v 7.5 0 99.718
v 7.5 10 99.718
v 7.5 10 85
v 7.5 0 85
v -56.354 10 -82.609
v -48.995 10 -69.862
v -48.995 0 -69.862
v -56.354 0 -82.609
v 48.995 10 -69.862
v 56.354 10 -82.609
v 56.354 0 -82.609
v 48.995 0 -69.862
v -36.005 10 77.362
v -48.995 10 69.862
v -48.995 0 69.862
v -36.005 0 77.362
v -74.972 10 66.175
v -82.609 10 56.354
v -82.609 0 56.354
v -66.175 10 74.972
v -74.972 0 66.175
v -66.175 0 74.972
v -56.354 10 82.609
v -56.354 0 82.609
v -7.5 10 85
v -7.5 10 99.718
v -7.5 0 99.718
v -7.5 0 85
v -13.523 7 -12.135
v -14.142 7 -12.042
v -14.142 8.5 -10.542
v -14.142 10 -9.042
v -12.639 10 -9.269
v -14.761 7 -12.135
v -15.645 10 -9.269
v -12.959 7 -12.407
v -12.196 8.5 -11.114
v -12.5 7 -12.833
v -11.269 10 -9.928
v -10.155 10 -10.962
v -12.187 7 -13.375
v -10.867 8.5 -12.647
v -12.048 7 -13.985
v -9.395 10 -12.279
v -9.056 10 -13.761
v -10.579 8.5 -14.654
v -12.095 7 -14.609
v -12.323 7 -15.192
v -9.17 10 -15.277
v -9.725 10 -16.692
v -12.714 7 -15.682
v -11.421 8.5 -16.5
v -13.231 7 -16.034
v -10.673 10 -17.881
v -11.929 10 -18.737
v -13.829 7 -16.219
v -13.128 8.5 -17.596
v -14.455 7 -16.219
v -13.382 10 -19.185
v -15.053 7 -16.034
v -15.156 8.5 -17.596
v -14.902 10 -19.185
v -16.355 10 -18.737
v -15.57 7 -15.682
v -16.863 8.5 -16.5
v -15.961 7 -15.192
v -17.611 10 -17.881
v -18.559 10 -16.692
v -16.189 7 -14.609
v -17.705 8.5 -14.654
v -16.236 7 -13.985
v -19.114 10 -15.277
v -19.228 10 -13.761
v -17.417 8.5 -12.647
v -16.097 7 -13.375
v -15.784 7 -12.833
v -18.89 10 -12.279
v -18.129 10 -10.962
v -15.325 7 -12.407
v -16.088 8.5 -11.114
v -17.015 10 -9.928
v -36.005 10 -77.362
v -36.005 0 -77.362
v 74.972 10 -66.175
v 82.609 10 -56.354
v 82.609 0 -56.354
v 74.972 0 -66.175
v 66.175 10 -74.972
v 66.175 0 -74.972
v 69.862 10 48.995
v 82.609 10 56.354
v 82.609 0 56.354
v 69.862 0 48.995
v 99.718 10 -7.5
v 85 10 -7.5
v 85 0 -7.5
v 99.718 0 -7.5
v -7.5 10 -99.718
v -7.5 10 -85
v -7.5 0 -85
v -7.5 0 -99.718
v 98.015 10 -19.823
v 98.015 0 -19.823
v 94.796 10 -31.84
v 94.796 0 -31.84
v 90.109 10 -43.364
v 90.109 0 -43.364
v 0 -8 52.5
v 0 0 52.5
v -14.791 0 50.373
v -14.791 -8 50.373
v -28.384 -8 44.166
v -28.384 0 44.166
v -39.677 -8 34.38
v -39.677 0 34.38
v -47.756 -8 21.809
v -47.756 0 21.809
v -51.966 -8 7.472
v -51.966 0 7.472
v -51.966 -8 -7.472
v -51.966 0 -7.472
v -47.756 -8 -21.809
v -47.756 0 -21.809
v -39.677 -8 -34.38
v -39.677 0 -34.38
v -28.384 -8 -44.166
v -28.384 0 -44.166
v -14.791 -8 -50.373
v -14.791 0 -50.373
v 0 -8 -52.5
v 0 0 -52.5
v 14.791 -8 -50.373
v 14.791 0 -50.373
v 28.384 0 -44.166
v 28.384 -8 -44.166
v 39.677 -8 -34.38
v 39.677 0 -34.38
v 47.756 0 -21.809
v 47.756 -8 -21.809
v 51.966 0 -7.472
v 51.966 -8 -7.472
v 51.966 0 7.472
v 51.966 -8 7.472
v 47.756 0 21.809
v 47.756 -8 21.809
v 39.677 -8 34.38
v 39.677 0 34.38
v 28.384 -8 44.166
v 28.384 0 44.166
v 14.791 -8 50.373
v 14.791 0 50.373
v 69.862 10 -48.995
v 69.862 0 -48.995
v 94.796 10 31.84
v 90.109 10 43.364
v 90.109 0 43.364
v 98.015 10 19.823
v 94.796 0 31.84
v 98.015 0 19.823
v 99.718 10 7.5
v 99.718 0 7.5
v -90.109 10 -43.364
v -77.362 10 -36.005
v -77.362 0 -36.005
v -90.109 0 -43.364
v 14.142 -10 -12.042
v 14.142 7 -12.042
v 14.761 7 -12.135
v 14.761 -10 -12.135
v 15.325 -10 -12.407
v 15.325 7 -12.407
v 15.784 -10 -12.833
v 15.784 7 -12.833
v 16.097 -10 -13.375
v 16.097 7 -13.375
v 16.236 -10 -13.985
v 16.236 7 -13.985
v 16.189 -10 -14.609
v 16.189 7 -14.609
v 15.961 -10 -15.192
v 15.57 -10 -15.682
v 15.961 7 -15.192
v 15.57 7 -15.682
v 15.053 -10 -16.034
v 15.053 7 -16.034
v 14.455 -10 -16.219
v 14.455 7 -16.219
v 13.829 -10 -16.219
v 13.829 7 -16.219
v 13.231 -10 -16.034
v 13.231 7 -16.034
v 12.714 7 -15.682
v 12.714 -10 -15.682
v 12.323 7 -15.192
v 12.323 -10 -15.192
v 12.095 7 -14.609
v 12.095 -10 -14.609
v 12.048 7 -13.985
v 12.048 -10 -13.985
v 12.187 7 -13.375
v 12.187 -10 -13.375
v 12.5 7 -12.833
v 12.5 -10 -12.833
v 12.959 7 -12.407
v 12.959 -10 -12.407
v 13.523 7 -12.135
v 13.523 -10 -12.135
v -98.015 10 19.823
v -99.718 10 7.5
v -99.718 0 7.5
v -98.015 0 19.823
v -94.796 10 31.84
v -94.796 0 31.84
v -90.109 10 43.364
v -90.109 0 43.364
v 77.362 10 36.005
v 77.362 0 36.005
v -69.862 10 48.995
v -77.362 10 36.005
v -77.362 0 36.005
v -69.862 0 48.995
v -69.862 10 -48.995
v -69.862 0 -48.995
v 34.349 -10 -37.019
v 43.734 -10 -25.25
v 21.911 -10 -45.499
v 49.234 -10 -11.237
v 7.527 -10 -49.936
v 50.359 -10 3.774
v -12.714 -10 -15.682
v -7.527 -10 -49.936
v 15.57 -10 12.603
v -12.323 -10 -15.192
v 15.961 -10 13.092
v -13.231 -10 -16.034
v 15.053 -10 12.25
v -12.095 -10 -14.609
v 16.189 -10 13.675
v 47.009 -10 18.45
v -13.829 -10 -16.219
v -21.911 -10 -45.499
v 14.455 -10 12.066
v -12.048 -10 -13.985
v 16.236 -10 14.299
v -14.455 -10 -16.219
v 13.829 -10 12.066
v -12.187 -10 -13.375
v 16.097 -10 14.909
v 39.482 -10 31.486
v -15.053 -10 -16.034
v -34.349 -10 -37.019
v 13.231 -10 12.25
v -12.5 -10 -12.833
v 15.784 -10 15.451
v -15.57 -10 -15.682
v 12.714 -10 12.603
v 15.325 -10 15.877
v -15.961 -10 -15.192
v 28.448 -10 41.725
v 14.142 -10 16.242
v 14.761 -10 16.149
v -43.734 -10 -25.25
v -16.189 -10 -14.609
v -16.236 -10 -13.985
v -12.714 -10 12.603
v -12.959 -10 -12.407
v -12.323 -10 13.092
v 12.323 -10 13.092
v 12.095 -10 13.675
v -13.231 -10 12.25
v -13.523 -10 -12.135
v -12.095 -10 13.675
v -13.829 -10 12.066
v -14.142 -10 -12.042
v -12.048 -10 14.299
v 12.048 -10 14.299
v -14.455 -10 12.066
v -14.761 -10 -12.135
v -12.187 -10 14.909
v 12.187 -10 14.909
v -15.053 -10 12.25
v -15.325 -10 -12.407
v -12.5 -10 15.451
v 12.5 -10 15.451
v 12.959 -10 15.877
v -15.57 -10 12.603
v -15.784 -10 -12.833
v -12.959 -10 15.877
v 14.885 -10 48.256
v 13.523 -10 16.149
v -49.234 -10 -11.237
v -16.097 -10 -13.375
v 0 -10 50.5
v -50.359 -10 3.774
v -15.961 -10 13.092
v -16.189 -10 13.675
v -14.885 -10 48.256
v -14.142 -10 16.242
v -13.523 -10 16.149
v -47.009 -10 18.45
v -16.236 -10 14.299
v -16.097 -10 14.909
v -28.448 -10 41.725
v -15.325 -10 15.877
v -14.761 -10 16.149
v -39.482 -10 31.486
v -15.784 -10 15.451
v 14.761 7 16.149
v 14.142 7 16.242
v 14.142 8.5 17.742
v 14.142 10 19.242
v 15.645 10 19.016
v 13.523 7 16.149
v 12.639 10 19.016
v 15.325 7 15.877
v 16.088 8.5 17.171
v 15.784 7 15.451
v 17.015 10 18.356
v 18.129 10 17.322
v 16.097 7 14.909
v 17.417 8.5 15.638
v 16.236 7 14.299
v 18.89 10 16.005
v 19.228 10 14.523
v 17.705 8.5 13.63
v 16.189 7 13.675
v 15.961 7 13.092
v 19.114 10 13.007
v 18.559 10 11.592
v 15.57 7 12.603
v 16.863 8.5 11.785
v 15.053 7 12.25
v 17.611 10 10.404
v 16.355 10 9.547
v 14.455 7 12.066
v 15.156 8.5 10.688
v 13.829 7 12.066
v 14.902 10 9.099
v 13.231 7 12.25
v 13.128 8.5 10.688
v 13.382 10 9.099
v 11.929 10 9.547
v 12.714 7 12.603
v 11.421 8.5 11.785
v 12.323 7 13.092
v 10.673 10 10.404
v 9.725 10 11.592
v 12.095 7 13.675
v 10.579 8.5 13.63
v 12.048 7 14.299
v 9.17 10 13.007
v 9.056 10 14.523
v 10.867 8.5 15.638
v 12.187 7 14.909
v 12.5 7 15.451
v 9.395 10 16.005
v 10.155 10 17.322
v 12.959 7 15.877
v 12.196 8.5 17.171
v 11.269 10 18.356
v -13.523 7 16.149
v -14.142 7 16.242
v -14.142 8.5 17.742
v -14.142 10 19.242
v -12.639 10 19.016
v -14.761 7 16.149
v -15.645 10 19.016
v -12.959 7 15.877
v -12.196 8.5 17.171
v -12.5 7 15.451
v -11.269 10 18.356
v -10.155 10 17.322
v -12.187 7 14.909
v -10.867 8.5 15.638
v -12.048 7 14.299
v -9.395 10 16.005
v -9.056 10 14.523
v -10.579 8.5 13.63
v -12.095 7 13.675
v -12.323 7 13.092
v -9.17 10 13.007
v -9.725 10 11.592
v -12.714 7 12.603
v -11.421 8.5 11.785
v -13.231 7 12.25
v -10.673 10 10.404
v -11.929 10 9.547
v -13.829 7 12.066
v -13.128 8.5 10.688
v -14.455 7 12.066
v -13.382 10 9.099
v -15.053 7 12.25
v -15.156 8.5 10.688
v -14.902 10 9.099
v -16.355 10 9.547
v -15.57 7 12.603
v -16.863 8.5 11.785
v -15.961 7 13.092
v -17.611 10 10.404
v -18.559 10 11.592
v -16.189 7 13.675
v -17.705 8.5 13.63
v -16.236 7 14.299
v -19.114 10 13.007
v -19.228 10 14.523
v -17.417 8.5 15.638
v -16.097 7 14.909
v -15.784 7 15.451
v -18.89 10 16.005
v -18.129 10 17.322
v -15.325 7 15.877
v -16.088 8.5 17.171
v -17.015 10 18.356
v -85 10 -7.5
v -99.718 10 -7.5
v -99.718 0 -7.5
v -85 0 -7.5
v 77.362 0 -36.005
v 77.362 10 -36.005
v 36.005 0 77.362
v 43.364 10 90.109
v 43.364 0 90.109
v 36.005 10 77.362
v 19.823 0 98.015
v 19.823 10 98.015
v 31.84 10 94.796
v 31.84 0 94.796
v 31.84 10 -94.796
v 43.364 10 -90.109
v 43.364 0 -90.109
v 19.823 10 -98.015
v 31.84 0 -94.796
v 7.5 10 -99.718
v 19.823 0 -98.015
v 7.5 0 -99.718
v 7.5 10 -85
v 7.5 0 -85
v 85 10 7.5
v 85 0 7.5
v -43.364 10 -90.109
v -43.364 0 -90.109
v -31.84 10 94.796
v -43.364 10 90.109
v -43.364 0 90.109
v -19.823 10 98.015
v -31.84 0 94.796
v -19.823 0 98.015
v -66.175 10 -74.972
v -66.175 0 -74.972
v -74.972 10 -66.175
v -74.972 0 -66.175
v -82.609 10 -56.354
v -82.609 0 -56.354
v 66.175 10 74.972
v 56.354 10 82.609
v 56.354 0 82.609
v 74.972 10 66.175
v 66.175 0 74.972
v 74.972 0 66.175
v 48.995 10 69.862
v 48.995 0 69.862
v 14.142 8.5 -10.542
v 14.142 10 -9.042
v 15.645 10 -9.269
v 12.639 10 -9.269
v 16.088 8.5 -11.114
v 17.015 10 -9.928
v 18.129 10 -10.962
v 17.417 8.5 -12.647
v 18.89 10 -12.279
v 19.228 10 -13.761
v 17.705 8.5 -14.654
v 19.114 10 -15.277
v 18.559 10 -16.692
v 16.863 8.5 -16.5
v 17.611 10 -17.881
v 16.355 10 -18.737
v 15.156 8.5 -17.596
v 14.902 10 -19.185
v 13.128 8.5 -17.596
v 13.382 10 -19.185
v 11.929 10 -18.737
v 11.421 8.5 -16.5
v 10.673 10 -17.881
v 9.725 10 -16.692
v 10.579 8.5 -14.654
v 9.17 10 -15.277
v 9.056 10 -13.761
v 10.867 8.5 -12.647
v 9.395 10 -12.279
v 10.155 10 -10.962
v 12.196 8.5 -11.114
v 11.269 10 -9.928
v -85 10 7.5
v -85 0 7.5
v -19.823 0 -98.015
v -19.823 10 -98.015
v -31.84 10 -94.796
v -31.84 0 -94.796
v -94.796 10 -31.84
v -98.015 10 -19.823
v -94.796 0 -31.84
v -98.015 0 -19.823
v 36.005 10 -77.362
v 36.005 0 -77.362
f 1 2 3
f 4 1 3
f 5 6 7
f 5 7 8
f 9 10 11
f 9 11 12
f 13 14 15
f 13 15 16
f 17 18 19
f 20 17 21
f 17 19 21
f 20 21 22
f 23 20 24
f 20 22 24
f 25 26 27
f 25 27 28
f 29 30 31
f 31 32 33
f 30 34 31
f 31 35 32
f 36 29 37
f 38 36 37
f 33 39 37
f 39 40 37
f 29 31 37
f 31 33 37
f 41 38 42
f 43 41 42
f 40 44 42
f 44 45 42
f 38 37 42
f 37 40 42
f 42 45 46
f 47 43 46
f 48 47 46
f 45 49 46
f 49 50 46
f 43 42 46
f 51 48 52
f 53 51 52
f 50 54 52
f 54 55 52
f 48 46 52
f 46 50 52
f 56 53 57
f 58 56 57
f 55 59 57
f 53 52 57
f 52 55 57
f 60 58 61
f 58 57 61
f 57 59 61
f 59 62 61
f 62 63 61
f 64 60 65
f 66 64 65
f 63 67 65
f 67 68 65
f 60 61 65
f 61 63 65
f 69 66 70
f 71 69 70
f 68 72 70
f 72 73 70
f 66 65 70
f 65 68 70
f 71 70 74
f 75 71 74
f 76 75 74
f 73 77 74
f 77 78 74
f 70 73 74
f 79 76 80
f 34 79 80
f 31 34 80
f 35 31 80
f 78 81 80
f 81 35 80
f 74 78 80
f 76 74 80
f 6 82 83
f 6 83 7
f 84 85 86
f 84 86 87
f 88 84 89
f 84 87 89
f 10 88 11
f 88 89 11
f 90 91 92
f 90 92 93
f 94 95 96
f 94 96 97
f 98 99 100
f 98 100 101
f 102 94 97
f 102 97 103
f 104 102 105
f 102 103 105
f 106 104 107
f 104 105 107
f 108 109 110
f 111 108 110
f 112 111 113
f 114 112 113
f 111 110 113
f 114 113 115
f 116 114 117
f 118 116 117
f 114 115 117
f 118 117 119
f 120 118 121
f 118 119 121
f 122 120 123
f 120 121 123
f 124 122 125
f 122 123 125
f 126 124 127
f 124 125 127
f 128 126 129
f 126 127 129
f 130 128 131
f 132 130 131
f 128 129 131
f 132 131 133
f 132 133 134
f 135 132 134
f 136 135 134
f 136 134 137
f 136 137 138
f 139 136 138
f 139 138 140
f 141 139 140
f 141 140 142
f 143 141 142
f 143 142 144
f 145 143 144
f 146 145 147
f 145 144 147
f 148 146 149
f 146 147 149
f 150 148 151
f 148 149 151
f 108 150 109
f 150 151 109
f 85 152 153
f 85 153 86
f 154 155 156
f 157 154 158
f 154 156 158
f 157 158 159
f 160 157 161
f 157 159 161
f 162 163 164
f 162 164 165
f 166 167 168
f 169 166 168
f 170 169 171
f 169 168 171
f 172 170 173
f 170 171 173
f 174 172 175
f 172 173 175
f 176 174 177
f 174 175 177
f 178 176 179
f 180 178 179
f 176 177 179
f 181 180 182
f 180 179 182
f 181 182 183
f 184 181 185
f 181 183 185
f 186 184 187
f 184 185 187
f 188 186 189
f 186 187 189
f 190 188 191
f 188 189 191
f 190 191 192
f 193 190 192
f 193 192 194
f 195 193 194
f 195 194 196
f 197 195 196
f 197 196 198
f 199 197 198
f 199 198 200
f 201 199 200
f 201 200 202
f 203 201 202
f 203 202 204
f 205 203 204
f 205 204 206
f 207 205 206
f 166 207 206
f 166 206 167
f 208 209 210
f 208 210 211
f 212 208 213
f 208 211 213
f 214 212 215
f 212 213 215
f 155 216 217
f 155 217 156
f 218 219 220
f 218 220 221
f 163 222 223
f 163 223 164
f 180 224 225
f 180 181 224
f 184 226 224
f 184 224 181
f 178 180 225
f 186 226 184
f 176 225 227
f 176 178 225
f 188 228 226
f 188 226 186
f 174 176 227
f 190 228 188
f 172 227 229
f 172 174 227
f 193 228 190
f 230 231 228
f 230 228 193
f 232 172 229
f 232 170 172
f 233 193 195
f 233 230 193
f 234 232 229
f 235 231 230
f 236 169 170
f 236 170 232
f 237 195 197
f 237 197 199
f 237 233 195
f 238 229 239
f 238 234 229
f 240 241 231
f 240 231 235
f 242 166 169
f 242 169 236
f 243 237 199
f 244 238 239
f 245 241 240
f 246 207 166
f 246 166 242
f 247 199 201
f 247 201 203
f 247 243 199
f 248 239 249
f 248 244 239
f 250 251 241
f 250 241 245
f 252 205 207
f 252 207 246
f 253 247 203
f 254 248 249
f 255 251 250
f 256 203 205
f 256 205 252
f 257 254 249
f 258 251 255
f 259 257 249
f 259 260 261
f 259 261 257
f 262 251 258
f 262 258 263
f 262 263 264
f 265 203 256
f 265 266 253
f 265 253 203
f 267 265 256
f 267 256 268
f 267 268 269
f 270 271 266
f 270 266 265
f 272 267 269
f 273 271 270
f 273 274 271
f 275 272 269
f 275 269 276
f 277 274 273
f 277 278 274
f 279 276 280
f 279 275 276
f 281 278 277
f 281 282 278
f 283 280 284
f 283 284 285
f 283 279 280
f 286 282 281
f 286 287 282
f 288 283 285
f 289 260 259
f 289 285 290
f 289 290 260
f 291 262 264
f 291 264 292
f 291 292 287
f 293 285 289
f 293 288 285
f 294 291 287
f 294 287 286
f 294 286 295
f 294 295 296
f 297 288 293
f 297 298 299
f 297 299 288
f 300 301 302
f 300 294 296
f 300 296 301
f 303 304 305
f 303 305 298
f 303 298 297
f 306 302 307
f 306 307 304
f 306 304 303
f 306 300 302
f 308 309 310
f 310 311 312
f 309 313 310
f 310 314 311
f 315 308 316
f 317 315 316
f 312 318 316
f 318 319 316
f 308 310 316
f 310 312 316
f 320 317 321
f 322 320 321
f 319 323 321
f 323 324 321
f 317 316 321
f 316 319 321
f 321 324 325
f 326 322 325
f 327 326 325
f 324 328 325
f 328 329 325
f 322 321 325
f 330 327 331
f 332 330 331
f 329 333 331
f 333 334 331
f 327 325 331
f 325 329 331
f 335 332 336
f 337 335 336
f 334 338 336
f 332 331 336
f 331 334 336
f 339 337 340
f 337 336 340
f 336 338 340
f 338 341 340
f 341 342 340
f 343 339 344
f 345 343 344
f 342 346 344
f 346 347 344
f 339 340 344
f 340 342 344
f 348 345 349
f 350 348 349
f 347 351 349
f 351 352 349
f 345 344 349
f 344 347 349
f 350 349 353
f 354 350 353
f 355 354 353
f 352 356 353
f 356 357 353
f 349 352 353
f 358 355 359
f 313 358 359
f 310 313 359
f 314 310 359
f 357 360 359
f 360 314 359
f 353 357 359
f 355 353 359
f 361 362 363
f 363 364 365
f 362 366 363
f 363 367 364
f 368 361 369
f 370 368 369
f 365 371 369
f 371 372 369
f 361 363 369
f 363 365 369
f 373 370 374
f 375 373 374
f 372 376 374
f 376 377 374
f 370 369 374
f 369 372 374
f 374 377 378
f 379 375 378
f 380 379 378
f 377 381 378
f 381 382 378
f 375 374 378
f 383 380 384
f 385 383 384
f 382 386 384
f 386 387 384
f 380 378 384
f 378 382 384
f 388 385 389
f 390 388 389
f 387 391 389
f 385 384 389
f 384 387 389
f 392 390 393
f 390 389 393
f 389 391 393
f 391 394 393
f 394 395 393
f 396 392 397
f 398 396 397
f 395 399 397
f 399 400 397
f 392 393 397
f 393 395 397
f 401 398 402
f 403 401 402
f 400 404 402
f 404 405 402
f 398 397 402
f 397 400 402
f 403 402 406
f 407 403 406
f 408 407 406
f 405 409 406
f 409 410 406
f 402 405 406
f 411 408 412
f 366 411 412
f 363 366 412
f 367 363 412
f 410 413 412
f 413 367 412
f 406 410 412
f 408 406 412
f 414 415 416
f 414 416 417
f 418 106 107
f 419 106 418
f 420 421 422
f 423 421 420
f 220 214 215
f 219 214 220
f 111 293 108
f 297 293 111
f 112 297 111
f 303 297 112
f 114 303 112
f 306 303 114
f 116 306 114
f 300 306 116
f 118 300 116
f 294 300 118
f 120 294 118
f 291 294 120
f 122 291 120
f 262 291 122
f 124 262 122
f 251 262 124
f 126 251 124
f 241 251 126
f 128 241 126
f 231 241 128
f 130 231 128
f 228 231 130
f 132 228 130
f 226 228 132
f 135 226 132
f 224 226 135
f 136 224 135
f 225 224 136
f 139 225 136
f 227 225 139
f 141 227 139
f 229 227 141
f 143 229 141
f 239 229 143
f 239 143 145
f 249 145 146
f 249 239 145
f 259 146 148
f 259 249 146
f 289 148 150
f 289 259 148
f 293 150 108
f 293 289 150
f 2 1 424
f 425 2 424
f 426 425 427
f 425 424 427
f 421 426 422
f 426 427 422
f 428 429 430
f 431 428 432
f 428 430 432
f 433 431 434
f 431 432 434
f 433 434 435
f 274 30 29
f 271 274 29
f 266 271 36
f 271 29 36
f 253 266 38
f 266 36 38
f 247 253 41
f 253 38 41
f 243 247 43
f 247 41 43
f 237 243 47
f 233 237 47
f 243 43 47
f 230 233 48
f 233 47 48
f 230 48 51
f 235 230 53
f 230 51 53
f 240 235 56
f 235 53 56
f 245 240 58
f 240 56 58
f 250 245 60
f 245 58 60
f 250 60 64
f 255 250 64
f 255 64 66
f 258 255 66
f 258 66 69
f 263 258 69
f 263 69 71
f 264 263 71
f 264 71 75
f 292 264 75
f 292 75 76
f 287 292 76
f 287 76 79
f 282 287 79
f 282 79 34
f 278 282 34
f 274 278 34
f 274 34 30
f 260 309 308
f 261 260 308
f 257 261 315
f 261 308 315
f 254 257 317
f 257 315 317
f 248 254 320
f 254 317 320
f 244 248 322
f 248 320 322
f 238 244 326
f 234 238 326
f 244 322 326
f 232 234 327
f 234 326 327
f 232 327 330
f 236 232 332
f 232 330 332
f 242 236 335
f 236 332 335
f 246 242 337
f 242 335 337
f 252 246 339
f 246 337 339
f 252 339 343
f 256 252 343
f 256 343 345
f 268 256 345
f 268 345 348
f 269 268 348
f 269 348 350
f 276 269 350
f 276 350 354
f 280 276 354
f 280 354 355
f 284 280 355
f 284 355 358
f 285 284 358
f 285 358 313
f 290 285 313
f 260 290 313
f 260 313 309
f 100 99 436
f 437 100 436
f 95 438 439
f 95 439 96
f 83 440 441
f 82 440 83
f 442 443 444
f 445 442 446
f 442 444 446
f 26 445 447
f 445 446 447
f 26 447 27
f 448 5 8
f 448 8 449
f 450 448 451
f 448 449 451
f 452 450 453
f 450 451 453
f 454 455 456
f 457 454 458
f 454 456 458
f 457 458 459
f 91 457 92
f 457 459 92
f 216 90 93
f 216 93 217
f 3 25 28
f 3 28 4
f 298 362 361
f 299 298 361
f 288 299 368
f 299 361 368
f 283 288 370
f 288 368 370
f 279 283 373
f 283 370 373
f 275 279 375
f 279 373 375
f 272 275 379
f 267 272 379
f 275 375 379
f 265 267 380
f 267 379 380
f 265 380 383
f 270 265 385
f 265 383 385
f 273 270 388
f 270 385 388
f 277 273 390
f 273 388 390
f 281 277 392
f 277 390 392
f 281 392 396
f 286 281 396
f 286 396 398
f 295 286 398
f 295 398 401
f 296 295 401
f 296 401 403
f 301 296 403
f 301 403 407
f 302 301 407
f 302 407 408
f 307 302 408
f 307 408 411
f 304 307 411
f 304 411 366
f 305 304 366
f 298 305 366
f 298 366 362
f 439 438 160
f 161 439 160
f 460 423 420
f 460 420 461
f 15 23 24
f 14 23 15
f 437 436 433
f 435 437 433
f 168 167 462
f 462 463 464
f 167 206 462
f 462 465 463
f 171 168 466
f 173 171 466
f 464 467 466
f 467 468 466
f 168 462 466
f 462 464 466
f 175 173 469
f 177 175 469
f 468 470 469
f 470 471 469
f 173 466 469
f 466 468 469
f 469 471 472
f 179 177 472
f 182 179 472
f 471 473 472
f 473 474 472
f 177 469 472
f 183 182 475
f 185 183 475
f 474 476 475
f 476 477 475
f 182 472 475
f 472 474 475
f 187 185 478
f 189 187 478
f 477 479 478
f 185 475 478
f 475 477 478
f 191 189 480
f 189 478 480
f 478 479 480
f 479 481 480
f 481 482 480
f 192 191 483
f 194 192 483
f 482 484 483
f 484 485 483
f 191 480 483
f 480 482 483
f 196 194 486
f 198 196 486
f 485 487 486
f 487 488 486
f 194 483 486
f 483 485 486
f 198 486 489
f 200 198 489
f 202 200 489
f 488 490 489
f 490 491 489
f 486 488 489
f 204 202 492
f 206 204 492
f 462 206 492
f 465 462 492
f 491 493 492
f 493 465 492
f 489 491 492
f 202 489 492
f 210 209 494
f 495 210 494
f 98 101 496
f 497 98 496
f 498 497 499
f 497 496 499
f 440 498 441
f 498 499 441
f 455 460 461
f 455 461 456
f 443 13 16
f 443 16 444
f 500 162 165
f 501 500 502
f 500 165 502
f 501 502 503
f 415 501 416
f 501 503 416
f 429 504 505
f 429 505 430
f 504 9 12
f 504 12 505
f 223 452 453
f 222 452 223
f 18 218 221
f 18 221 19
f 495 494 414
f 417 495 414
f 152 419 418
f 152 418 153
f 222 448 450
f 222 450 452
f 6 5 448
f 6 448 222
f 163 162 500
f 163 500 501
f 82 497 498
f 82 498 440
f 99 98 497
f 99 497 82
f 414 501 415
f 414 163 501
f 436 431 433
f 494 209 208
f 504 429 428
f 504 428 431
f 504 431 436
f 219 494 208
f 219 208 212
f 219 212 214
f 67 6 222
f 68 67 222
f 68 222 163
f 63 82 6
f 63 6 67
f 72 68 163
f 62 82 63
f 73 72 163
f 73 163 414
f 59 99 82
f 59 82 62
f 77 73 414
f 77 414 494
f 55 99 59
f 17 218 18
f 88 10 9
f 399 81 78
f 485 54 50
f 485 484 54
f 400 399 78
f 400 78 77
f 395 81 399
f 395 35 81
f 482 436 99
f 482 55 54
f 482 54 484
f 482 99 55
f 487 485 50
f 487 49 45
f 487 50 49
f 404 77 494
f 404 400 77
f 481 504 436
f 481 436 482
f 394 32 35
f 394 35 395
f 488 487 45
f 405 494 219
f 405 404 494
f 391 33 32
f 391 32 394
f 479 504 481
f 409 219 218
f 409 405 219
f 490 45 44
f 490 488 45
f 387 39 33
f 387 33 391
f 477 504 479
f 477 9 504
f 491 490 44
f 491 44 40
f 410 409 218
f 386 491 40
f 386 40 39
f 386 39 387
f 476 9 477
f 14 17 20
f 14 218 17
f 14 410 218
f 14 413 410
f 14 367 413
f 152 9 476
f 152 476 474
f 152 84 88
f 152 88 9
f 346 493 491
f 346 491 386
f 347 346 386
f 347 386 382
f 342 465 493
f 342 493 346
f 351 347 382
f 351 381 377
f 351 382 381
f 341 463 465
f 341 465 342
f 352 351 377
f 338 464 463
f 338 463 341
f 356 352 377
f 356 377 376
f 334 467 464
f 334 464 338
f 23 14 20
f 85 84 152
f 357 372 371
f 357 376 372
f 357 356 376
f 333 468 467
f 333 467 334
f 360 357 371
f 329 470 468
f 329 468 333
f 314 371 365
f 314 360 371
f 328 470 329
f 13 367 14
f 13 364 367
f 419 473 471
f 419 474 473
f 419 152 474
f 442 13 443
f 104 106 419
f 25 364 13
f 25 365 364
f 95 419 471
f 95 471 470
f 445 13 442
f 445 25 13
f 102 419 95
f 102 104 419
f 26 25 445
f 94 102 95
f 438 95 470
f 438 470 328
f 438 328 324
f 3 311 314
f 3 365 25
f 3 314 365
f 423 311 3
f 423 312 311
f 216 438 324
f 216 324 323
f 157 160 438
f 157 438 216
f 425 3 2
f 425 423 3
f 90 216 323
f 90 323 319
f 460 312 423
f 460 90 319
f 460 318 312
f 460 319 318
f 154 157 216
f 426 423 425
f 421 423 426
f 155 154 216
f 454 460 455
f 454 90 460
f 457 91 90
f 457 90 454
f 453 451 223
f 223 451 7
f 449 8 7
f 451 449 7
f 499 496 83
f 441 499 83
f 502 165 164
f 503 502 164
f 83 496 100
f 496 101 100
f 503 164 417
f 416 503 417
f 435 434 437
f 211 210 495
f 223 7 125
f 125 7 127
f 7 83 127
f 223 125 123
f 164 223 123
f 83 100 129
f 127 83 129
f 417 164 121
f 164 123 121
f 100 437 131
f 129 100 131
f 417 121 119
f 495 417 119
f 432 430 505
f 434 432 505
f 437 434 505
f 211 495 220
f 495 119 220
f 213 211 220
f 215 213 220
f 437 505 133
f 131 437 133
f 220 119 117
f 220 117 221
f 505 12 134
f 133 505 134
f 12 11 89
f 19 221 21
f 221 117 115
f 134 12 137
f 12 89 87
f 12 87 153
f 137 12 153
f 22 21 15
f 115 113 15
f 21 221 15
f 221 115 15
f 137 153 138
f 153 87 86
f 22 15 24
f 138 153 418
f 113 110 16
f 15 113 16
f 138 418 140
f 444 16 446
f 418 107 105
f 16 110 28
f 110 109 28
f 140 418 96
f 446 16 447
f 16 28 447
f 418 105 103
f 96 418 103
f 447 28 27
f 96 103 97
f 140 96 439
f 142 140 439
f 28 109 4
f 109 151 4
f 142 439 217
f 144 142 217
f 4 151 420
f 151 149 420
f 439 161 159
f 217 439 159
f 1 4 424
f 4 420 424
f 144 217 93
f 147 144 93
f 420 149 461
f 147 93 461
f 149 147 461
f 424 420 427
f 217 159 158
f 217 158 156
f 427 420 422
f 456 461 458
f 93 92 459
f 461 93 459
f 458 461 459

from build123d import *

# Parameters (mm, degrees)
SKIZZE1_R                       = 100
AUFSATZ_LINEAR_AUSTRAGEN1_DEPTH = 10
SKIZZE2_W                       = 15
SKIZZE2_H                       = 15
SCHNITT_LINEAR_AUSTRAGEN1_DEPTH = 142.774468788
SKIZZE3_R                       = 52.5
AUFSATZ_LINEAR_AUSTRAGEN2_DEPTH = 10
FASE1_SIZE                      = 2
SKIZZE4_R                       = 2.1
SCHNITT_LINEAR_AUSTRAGEN2_DEPTH = 143.434195332
FASE2_SIZE                      = 3


with BuildPart() as part:
    # Skizze1 → Aufsatz-Linear austragen1 (new body)
    with BuildSketch(Plane(origin=(0, 0, 0), x_dir=(1, 0, 0), z_dir=(0, 1, 0))):
        with Locations(Location((0, 0, 0), (0, 0, 270))):
            Circle(SKIZZE1_R)
    extrude(amount=AUFSATZ_LINEAR_AUSTRAGEN1_DEPTH)

    # Skizze2 → Schnitt-Linear austragen1 (cut, through all)
    with BuildSketch(Plane(origin=(0, 10, 0), x_dir=(1, 0, 0), z_dir=(0, 1, 0))):
        Polygon((77.362159322, -36.004809472), (90.352540378, -43.504809472), (82.852540378, -56.495190528), (69.862159322, -48.995190528), align=None)
        with Locations((92.5, 0)):
            Rectangle(SKIZZE2_W, SKIZZE2_H)
        Polygon((48.995190528, -69.862159322), (56.495190528, -82.852540378), (43.504809472, -90.352540378), (36.004809472, -77.362159322), align=None)
        with Locations((0, -92.5)):
            Rectangle(SKIZZE2_W, SKIZZE2_H)
        Polygon((-36.004809472, -77.362159322), (-43.504809472, -90.352540378), (-56.495190528, -82.852540378), (-48.995190528, -69.862159322), align=None)
        Polygon((-69.862159322, -48.995190528), (-82.852540378, -56.495190528), (-90.352540378, -43.504809472), (-77.362159322, -36.004809472), align=None)
        with Locations((-92.5, 0)):
            Rectangle(SKIZZE2_W, SKIZZE2_H)
        Polygon((-77.362159322, 36.004809472), (-90.352540378, 43.504809472), (-82.852540378, 56.495190528), (-69.862159322, 48.995190528), align=None)
        Polygon((-48.995190528, 69.862159322), (-56.495190528, 82.852540378), (-43.504809472, 90.352540378), (-36.004809472, 77.362159322), align=None)
        with Locations((0, 92.5)):
            Rectangle(SKIZZE2_W, SKIZZE2_H)
        Polygon((36.004809472, 77.362159322), (43.504809472, 90.352540378), (56.495190528, 82.852540378), (48.995190528, 69.862159322), align=None)
        Polygon((69.862159322, 48.995190528), (82.852540378, 56.495190528), (90.352540378, 43.504809472), (77.362159322, 36.004809472), align=None)
    extrude(amount=-SCHNITT_LINEAR_AUSTRAGEN1_DEPTH, mode=Mode.SUBTRACT)

    # Skizze3 → Aufsatz-Linear austragen2 (add)
    with BuildSketch(Plane.XZ):
        with Locations(Location((0, 0, 0), (0, 0, 90))):
            Circle(SKIZZE3_R)
    extrude(amount=AUFSATZ_LINEAR_AUSTRAGEN2_DEPTH)

    # Fase1
    fase1_edges = [part.edges().sort_by_distance(p)[0] for p in [
        (0, -10, -52.5),
    ]]
    chamfer(fase1_edges, length=FASE1_SIZE)

    # Skizze4 → Schnitt-Linear austragen2 (cut, through all)
    with BuildSketch(Plane(origin=(0, 10, 0), x_dir=(1, 0, 0), z_dir=(0, 1, 0))):
        with Locations(Location((-14.142135624, 14.142135624, 0), (0, 0, 270))):
            Circle(SKIZZE4_R)
        with Locations(Location((14.142135624, 14.142135624, 0), (0, 0, 270))):
            Circle(SKIZZE4_R)
        with Locations(Location((14.142135624, -14.142135624, 0), (0, 0, 270))):
            Circle(SKIZZE4_R)
        with Locations(Location((-14.142135624, -14.142135624, 0), (0, 0, 270))):
            Circle(SKIZZE4_R)
    extrude(amount=-SCHNITT_LINEAR_AUSTRAGEN2_DEPTH, mode=Mode.SUBTRACT)

    # Fase2
    fase2_edges = [part.edges().sort_by_distance(p)[0] for p in [
        (-14.142135624, 10, 12.042135624),
        (14.142135624, 10, 12.042135624),
        (14.142135624, 10, -16.242135624),
        (-14.142135624, 10, -16.242135624),
    ]]
    chamfer(fase2_edges, length=FASE2_SIZE)


solid = part.part
